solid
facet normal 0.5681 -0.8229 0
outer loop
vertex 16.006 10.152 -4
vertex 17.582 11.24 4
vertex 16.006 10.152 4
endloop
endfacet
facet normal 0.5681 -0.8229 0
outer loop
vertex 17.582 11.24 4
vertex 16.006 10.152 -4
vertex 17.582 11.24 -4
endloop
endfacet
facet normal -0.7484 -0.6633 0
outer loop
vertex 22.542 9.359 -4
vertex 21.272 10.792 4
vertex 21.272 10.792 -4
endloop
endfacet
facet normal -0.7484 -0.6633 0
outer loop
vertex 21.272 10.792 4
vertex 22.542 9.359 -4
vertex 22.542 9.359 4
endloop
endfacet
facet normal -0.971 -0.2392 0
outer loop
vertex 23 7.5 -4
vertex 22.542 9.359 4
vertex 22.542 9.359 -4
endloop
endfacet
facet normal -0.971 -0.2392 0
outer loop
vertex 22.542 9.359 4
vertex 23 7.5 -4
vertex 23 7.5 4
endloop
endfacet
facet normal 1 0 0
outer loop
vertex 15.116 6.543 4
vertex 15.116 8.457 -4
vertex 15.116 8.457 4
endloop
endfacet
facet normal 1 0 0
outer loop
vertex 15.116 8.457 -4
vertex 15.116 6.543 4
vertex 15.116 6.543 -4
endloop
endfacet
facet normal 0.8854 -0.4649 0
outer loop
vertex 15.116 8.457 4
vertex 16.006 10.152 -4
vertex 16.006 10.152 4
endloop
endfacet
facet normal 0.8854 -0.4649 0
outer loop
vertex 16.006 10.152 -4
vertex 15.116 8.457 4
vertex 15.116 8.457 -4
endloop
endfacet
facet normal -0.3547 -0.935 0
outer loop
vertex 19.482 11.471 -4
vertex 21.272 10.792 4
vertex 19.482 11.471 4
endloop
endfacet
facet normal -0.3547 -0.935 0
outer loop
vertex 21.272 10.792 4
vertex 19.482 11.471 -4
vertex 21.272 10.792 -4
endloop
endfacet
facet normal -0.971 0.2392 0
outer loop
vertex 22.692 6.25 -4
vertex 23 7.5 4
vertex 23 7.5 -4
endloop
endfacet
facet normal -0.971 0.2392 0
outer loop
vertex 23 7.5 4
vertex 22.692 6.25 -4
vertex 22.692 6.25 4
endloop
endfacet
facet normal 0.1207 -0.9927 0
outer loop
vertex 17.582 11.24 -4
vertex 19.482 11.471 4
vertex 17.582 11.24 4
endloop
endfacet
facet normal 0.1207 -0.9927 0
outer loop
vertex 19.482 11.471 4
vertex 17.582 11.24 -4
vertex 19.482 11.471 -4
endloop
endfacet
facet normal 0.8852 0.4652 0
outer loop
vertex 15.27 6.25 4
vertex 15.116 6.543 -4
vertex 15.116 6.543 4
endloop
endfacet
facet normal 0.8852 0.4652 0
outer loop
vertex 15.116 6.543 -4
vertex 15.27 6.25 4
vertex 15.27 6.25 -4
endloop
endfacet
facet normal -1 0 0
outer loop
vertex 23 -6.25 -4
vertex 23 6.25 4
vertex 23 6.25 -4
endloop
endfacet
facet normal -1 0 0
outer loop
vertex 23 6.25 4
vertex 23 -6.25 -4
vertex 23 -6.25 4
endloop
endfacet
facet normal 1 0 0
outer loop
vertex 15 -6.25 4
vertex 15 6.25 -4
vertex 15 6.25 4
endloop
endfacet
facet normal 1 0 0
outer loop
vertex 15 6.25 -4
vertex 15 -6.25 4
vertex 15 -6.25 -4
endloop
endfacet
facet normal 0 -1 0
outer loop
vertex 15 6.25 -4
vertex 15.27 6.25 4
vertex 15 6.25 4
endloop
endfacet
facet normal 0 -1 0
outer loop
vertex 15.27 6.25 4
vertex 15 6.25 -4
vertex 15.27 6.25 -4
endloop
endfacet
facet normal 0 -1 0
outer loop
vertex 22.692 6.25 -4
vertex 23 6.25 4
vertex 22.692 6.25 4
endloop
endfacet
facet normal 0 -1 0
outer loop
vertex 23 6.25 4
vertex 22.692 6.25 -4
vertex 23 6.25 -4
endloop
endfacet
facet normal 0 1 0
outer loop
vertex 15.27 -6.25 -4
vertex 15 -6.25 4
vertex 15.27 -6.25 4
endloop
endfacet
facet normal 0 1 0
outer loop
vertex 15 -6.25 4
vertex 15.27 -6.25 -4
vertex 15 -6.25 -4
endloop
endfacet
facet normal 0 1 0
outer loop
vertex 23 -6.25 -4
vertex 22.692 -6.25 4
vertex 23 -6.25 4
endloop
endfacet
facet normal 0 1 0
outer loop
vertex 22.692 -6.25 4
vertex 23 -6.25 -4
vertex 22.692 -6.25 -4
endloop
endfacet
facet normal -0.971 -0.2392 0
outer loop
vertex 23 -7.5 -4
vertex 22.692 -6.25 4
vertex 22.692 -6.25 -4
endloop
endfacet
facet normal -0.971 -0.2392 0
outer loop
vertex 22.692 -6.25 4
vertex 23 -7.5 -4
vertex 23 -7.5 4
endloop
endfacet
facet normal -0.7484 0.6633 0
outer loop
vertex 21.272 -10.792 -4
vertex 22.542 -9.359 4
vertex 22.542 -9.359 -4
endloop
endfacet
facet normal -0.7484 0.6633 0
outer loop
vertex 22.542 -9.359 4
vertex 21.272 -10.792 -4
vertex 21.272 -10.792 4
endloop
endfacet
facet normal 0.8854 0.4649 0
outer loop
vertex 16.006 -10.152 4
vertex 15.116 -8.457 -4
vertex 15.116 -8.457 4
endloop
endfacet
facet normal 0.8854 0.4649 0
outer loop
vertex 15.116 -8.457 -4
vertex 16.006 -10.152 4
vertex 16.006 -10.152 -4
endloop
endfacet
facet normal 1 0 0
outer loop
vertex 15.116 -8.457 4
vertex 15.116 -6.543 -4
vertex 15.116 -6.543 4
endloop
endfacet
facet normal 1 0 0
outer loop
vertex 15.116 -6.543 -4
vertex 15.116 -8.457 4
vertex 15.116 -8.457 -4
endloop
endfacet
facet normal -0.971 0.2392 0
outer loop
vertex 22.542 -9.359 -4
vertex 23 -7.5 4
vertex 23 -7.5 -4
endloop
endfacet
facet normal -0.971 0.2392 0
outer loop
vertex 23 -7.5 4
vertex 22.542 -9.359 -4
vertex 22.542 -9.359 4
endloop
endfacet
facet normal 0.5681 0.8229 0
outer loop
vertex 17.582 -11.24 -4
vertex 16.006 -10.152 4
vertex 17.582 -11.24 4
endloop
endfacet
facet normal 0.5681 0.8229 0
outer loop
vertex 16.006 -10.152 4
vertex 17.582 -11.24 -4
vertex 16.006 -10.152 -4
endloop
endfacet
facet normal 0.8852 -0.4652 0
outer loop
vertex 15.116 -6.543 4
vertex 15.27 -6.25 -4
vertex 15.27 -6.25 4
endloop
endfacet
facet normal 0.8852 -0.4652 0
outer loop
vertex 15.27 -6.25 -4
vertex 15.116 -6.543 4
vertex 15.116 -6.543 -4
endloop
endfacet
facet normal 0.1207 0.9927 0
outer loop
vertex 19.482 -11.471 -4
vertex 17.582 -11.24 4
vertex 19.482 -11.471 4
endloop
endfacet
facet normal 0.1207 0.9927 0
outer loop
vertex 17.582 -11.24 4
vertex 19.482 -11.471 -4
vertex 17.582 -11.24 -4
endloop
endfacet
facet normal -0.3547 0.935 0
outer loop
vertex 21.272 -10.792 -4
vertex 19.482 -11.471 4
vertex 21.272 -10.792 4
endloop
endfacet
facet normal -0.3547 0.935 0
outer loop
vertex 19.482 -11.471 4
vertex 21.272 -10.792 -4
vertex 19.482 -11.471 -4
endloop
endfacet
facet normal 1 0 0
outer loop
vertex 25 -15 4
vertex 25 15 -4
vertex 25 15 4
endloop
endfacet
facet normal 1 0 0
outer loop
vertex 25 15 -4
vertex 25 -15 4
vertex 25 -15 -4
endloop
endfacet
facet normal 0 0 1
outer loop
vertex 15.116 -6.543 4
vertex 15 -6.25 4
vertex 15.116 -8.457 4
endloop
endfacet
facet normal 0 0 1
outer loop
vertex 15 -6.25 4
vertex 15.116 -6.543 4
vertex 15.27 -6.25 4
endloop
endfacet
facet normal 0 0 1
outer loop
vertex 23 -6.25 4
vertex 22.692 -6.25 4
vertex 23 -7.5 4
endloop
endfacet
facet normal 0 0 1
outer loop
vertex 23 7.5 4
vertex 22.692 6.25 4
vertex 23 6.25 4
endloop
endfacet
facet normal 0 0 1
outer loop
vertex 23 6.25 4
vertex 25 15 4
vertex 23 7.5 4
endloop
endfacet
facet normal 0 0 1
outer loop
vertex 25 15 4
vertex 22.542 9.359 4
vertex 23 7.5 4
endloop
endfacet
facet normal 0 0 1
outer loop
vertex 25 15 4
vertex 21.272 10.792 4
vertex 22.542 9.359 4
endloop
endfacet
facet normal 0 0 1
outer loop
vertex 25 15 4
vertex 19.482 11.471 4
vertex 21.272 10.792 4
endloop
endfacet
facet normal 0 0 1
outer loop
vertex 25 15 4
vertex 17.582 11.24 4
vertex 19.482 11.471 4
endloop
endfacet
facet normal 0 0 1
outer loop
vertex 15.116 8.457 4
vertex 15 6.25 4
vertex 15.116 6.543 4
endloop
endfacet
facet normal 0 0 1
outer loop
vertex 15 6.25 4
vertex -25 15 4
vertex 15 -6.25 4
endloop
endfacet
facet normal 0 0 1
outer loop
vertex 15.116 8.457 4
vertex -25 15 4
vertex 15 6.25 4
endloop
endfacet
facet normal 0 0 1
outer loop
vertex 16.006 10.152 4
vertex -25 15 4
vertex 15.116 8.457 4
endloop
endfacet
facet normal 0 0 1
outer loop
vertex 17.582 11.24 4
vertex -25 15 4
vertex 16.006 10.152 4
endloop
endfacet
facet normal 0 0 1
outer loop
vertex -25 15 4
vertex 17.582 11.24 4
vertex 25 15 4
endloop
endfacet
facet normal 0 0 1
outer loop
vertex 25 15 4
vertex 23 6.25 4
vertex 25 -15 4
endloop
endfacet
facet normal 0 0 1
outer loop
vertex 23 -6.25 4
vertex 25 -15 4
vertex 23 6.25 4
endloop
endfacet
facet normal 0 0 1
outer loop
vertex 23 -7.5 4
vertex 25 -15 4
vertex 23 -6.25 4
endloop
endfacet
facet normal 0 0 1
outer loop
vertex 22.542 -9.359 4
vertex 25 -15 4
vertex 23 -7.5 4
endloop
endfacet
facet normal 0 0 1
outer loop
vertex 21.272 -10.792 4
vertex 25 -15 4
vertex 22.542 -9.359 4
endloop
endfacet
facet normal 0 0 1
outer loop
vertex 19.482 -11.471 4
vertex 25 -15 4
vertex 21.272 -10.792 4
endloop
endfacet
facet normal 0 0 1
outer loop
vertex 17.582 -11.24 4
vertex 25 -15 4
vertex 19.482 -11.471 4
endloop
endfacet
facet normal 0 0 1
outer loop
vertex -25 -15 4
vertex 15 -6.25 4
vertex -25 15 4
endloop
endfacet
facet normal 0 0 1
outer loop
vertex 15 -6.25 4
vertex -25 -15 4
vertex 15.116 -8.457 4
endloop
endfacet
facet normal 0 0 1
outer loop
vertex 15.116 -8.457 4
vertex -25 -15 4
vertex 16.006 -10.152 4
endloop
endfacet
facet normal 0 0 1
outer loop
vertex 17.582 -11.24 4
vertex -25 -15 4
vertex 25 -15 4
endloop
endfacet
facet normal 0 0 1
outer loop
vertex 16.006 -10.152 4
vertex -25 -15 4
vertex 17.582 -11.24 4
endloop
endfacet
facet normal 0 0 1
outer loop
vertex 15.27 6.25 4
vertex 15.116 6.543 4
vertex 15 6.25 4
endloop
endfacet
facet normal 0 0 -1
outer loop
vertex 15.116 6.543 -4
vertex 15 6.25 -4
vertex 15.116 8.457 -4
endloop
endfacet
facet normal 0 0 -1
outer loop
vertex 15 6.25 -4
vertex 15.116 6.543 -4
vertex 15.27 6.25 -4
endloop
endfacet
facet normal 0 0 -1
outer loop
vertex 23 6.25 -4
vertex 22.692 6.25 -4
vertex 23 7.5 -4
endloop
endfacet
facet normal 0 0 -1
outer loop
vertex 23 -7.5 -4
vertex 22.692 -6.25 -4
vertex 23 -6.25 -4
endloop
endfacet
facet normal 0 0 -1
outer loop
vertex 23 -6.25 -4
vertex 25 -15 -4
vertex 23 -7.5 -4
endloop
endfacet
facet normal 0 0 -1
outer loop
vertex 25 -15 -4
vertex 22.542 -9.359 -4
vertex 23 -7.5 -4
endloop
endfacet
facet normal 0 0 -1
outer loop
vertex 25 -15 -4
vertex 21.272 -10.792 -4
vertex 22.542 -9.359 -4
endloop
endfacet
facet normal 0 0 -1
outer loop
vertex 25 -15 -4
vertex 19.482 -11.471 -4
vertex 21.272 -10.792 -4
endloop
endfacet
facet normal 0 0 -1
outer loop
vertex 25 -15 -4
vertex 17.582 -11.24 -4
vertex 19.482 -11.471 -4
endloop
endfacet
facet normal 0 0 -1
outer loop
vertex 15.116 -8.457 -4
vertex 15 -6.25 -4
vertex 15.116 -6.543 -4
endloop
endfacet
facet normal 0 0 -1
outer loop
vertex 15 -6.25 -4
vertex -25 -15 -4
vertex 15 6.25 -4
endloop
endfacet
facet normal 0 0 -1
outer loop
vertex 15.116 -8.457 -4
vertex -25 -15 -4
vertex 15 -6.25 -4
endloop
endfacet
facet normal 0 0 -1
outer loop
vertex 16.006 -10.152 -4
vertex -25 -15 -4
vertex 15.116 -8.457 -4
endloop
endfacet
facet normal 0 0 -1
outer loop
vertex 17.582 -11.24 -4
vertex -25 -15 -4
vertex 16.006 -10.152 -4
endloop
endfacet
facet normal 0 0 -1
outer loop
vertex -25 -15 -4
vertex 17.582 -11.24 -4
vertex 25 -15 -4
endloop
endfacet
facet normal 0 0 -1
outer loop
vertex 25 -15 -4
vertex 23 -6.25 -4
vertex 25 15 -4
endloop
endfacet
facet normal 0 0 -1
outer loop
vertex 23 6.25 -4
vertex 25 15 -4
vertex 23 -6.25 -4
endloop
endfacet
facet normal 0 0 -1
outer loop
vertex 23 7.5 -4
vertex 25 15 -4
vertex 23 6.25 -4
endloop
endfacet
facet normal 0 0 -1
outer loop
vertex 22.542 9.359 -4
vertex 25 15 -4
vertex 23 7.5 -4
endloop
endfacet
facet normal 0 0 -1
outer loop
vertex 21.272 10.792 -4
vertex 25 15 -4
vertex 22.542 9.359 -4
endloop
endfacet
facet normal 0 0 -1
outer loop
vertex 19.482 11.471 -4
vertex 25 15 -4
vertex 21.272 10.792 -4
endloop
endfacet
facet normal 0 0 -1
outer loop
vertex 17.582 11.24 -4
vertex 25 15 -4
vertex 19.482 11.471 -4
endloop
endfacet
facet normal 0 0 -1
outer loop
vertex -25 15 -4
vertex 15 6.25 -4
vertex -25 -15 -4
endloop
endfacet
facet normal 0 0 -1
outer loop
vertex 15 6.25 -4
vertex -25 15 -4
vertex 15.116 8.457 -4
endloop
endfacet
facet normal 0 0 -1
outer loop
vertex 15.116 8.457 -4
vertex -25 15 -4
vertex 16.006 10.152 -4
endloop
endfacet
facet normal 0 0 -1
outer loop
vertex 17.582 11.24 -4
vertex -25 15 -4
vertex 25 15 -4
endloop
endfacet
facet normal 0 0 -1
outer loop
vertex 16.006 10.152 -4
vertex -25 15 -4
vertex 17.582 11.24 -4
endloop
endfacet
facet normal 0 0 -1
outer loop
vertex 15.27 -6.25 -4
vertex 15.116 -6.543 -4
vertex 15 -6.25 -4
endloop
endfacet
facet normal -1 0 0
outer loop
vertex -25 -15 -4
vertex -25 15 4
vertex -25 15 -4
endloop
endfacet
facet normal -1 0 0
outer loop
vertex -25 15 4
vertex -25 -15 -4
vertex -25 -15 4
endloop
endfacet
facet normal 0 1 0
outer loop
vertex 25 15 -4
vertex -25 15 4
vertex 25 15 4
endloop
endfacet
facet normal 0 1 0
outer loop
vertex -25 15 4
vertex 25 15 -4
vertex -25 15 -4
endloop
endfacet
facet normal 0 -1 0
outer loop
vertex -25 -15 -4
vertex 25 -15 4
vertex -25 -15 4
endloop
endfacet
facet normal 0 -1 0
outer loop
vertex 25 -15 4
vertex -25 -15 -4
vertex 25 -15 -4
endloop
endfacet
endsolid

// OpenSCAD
// globals
w_length		= 50;
w_width 		= 30;
w_height 	= 8;

gap_w 		= 8;
gap_t		= 0.25;
gap_sk 		= 0.38;

module wedgie()
{
	difference()
	{
		union()
		{
			cube([w_length,w_width,w_height], center=true);
		}

		union()
		{
			translate([gap_sk*w_length,gap_t*w_width,0])		cylinder(d=gap_w, 1.1*w_height, center=true);
			translate([gap_sk*w_length,0,0])				cube([gap_w, gap_t*w_length, 1.1*w_width], center=true);
			translate([gap_sk*w_length,-gap_t*w_width,0])	cylinder(d=gap_w, 1.1*w_height, center=true);
		}
	}
}

wedgie();
